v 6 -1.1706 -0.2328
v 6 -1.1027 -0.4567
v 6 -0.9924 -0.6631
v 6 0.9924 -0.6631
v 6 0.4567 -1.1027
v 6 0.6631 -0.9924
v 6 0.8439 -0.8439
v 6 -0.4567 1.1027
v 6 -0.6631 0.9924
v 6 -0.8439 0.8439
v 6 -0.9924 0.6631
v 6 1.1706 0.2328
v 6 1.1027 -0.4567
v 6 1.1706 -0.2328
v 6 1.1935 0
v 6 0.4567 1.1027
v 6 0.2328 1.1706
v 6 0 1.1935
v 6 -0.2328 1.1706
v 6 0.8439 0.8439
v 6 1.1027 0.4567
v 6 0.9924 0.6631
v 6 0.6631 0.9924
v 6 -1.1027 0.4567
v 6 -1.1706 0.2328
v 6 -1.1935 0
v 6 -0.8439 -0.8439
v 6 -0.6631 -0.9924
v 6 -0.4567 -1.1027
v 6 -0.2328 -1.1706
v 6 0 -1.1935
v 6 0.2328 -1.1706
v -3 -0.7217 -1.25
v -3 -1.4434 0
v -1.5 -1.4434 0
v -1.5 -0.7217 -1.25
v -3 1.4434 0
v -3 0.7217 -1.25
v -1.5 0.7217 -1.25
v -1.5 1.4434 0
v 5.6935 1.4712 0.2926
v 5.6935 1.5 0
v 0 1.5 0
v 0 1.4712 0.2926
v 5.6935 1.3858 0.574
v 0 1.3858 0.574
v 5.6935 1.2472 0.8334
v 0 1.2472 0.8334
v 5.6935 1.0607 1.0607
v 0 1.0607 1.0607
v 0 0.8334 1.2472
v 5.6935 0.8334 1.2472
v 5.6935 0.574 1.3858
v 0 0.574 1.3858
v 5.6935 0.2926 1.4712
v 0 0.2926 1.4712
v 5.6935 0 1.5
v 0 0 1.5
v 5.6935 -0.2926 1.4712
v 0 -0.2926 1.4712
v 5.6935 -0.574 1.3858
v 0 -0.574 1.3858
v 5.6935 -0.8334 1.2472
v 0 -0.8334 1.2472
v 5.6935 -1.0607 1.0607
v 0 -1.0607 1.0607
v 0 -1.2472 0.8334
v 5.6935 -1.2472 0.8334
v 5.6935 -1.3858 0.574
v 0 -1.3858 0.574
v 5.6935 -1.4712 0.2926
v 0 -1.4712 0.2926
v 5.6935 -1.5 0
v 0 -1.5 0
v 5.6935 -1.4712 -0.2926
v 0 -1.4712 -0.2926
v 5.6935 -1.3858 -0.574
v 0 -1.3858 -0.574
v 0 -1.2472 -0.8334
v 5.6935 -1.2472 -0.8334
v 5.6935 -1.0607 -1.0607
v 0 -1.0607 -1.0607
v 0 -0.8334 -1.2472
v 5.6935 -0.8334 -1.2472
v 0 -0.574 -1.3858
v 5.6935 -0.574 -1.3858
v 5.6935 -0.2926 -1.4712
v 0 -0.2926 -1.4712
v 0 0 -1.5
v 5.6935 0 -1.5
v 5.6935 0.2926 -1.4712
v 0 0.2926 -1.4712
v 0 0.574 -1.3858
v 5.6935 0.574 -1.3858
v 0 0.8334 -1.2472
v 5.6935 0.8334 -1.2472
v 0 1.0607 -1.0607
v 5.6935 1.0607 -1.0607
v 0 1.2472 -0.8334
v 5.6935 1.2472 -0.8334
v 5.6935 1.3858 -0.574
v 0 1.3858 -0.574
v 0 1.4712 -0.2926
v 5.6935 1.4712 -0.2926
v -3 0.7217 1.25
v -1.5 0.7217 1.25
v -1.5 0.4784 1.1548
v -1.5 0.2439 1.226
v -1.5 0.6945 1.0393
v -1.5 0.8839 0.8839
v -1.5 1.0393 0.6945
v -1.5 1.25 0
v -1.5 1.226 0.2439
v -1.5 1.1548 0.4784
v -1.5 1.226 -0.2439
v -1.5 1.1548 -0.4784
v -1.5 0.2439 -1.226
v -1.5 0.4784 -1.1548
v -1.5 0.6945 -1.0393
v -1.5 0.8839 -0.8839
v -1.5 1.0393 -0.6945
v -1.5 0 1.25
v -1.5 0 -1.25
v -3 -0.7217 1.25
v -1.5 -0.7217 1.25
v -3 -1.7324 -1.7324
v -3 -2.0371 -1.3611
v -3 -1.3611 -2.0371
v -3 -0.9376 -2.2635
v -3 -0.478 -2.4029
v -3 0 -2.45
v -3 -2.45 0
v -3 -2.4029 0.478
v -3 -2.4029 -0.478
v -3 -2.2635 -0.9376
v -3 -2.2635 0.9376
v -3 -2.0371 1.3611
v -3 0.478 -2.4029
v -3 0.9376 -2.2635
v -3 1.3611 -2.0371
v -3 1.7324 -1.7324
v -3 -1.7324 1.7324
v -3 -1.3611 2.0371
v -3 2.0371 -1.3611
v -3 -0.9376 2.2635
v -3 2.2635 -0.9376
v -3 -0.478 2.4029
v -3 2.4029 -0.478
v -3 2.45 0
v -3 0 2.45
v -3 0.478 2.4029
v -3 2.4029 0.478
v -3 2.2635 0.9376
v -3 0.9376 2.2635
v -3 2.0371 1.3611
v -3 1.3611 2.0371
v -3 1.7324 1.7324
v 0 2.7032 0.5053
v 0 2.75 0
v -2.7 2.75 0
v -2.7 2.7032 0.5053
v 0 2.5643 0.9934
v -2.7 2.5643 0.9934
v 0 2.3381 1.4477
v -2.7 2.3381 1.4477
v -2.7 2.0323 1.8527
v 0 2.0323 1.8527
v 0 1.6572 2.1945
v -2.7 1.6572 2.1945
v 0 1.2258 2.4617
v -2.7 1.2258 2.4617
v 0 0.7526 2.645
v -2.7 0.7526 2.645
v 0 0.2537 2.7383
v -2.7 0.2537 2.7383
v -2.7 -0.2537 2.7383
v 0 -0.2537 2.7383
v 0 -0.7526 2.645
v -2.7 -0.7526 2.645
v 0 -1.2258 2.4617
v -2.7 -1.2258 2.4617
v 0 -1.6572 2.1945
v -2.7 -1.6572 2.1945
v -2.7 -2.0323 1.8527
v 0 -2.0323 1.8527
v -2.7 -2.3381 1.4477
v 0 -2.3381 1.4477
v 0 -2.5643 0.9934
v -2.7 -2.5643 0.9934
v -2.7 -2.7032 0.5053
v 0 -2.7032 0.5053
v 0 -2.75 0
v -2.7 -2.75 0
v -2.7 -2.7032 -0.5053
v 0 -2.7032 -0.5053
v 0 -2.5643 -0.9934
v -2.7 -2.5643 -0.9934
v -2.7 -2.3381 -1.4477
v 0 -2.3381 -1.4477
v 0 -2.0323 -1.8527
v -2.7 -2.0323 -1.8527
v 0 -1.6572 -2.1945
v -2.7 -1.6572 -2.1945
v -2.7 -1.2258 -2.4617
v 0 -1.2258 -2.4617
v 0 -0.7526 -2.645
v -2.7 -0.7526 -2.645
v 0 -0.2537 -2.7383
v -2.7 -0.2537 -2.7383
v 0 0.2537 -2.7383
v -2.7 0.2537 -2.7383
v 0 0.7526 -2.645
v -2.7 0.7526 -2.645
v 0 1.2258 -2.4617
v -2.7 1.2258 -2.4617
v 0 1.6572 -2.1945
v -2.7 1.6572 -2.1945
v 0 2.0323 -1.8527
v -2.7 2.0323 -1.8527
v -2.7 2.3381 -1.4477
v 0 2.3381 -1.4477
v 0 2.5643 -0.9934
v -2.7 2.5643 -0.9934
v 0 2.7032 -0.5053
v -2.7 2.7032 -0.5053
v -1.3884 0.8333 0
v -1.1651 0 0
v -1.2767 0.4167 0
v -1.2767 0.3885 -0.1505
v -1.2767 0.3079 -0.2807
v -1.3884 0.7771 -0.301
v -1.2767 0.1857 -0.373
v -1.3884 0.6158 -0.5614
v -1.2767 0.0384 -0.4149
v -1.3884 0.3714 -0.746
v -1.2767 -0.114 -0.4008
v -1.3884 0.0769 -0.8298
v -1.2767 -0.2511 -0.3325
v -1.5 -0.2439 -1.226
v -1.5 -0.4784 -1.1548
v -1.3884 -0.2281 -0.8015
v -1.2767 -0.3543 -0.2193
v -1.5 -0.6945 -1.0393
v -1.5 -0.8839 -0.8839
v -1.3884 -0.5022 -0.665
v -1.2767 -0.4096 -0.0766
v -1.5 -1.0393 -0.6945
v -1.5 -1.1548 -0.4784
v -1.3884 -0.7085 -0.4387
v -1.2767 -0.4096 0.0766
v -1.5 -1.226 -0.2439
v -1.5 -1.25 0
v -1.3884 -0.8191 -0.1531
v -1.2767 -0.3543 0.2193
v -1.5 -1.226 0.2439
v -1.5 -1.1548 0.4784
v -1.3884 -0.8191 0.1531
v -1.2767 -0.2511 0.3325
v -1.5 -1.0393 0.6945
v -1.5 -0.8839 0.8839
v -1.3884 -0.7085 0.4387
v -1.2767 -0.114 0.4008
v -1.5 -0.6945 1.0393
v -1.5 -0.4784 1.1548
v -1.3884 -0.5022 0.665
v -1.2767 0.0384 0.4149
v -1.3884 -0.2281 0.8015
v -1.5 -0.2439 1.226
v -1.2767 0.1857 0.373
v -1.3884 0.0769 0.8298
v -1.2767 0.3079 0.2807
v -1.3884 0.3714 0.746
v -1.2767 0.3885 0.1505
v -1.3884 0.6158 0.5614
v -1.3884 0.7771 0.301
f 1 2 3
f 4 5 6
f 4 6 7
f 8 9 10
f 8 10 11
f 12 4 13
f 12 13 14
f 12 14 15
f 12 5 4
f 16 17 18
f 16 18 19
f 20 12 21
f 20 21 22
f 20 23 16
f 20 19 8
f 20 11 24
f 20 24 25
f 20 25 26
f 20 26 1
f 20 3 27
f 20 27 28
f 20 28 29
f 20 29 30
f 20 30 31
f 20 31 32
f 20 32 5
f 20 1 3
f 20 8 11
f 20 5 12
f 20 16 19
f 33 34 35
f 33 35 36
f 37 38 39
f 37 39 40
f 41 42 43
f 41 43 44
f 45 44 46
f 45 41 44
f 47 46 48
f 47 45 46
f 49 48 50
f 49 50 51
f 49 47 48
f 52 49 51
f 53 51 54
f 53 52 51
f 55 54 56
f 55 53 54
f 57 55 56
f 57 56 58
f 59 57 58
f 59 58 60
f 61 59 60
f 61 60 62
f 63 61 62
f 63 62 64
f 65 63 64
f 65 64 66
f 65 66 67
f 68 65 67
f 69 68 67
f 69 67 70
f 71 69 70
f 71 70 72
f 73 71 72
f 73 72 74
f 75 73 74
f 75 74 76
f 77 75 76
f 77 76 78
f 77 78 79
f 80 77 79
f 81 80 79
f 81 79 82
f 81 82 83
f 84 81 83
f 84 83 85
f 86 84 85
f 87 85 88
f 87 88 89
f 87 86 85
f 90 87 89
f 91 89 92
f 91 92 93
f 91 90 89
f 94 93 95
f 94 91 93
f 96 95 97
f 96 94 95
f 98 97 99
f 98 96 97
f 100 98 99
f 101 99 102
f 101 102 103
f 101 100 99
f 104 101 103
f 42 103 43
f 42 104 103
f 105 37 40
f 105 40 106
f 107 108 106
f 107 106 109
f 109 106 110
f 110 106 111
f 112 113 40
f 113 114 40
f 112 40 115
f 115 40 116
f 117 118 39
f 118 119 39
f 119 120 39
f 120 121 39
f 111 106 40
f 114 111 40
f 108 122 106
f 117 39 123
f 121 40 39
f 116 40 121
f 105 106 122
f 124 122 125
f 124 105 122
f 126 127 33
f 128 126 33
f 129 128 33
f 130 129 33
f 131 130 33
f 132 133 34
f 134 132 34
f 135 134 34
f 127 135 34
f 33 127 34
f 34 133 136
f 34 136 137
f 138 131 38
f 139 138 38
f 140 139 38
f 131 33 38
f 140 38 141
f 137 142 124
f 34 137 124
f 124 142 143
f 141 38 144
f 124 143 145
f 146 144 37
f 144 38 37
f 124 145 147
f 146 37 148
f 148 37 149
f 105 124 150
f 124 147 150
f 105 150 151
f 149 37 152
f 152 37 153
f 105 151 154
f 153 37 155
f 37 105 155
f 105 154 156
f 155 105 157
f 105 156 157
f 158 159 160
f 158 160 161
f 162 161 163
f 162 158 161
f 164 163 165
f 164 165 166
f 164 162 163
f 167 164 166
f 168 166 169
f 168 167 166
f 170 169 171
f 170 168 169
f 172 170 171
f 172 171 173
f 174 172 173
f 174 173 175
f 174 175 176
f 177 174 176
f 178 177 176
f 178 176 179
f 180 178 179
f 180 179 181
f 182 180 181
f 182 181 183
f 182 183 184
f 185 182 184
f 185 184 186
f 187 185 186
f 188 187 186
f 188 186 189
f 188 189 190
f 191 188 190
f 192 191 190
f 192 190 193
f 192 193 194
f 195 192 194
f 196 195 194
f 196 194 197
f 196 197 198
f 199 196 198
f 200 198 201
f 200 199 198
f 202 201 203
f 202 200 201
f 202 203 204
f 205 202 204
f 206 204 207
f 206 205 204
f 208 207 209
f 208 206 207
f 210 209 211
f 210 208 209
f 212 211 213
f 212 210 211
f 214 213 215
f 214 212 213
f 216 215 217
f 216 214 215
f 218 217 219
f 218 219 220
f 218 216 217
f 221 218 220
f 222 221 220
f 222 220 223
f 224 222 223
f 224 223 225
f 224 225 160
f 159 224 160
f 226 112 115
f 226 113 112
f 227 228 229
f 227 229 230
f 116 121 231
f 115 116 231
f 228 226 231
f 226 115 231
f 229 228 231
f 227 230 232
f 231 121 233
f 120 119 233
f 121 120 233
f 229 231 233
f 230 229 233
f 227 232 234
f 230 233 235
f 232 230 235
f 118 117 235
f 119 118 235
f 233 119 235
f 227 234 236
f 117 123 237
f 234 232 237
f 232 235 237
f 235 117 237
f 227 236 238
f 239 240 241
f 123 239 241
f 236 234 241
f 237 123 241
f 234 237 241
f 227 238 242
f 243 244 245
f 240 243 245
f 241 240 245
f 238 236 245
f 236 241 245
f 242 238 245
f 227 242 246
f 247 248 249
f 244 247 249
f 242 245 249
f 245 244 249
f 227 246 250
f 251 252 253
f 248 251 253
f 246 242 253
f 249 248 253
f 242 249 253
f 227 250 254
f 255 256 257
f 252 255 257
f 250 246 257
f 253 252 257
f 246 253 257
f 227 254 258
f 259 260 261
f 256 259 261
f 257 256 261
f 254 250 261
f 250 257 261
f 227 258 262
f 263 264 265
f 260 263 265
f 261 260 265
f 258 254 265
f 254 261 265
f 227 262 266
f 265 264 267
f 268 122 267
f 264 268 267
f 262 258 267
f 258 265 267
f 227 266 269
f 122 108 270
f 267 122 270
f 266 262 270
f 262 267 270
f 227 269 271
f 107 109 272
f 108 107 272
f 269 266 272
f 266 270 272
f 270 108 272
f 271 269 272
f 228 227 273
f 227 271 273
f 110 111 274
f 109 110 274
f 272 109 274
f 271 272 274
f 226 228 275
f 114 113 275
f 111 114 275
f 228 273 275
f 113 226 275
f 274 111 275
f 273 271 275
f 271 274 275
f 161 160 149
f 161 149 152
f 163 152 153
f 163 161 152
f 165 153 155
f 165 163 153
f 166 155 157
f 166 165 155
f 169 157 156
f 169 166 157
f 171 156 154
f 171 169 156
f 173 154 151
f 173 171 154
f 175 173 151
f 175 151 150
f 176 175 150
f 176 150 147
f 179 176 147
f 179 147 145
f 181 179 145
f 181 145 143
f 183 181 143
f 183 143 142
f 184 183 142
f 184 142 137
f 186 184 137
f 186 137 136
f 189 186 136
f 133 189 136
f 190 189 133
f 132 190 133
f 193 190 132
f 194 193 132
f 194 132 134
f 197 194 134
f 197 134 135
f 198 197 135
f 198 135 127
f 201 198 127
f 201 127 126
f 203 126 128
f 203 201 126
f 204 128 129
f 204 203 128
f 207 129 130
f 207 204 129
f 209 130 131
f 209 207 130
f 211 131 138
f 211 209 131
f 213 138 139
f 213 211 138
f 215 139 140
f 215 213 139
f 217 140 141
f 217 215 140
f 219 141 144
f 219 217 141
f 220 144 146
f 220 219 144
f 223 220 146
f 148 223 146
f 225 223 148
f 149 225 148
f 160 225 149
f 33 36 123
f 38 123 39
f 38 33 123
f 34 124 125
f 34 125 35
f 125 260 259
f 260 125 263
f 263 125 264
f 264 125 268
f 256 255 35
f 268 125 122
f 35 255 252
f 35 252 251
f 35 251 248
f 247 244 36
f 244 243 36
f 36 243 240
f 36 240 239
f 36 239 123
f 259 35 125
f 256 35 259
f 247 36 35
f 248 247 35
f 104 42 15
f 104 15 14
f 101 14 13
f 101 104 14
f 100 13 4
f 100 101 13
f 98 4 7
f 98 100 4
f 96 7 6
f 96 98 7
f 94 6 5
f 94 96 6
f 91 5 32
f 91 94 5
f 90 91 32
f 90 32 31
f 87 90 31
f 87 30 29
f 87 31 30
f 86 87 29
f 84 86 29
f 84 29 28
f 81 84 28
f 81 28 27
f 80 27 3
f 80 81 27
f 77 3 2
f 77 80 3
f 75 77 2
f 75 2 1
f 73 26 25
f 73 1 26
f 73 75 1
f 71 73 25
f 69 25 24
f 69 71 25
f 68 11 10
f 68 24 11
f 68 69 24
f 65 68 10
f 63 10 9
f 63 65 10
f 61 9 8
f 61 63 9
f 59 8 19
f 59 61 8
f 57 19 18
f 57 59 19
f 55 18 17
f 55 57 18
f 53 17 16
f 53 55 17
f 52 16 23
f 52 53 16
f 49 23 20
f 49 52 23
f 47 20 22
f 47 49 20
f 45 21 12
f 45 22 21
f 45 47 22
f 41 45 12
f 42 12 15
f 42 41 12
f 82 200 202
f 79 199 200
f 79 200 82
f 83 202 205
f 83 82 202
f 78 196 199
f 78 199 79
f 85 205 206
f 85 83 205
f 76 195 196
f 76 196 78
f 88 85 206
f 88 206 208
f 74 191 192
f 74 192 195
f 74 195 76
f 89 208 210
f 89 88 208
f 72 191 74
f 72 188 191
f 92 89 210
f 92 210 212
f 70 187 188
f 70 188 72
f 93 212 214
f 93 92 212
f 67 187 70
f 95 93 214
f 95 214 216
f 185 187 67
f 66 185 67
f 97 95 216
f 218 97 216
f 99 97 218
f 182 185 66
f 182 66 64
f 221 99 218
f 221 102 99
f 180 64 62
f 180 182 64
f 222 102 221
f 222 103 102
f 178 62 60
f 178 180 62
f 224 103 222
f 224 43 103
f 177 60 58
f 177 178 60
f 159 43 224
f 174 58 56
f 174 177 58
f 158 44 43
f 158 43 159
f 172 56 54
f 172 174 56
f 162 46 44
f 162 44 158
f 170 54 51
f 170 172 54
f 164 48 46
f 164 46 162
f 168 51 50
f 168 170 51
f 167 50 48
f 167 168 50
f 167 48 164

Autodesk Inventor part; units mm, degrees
sketch "Sketch_1" plane through (0, 0, 0) normal (0, 0, 1) x (1, 0, 0)
  line L0 (6, 0) -> (-3, 0)
  line L1 (-3, 0) -> (-3, 2.45)
  line L2 (-3, 2.45) -> (-2.7, 2.75)
  line L3 (-2.7, 2.75) -> (0, 2.75)
  line L4 (0, 2.75) -> (0, 1.5)
  line L5 (0, 1.5) -> (5.6935, 1.5)
  line L6 (5.6935, 1.5) -> (6, 1.1935)
  line L7 (6, 1.1935) -> (6, 0)
  line L8 (6, 0) -> (-3, 0)
revolve "Revolution1" add sketch "Sketch_1" angle 360 about axis through (6, 0, 0) along (1, 0, 0)
thread "Thread1" size "M3x0.5" class "6g" standard "ISO Metric profile" length 5.5 offset 0.5
sketch "Sketch_4" plane through (0, 0, 0) normal (0, 0, 1) x (1, 0, 0)
  line L0 (-1.1651, 0) -> (-3, 0)
  line L1 (-3, 0) -> (-3, 1.25)
  line L2 (-3, 1.25) -> (-1.5, 1.25)
  line L3 (-1.5, 1.25) -> (-1.1651, 0)
  line L4 (-1.1651, 0) -> (-3, 0)
revolve "Revolution2" cut sketch "Sketch_4" angle 360 about axis through (-1.1651, 0, 0) along (1, 0, 0)
sketch "Sketch_3" plane through (-3, 0, 0) normal (1, 0, 0) x (0, 0, -1)
  line L0 (-1.25, 0.7217) -> (-1.25, -0.7217)
  line L1 (-1.25, -0.7217) -> (0, -1.4434)
  line L2 (0, -1.4434) -> (1.25, -0.7217)
  line L3 (1.25, -0.7217) -> (1.25, 0.7217)
  line L4 (1.25, 0.7217) -> (0, 1.4434)
  line L5 (0, 1.4434) -> (-1.25, 0.7217)
extrude "Extrusion1" cut sketch "Sketch_3" along normal blind 1.5
ref_plane "nut_XY" through (6, 0, 0) normal (1, 0, 0) x (0, 0, -1)
ref_plane "nut_YZ" through (6, 0, 0) normal (0, 0, -1) x (0, 1, 0)
ref_plane "nut_ZX" through (6, 0, 0) normal (0, 1, 0) x (1, 0, 0)
ref_plane "bolt_XY" through (0, 0, 0) normal (1, 0, 0) x (0, 0, -1)
ref_plane "bolt_YZ" through (0, 0, 0) normal (0, 0, -1) x (0, 1, 0)
ref_plane "bolt_ZX" through (0, 0, 0) normal (0, 1, 0) x (1, 0, 0)
properties part number "SCB3-6_1"
